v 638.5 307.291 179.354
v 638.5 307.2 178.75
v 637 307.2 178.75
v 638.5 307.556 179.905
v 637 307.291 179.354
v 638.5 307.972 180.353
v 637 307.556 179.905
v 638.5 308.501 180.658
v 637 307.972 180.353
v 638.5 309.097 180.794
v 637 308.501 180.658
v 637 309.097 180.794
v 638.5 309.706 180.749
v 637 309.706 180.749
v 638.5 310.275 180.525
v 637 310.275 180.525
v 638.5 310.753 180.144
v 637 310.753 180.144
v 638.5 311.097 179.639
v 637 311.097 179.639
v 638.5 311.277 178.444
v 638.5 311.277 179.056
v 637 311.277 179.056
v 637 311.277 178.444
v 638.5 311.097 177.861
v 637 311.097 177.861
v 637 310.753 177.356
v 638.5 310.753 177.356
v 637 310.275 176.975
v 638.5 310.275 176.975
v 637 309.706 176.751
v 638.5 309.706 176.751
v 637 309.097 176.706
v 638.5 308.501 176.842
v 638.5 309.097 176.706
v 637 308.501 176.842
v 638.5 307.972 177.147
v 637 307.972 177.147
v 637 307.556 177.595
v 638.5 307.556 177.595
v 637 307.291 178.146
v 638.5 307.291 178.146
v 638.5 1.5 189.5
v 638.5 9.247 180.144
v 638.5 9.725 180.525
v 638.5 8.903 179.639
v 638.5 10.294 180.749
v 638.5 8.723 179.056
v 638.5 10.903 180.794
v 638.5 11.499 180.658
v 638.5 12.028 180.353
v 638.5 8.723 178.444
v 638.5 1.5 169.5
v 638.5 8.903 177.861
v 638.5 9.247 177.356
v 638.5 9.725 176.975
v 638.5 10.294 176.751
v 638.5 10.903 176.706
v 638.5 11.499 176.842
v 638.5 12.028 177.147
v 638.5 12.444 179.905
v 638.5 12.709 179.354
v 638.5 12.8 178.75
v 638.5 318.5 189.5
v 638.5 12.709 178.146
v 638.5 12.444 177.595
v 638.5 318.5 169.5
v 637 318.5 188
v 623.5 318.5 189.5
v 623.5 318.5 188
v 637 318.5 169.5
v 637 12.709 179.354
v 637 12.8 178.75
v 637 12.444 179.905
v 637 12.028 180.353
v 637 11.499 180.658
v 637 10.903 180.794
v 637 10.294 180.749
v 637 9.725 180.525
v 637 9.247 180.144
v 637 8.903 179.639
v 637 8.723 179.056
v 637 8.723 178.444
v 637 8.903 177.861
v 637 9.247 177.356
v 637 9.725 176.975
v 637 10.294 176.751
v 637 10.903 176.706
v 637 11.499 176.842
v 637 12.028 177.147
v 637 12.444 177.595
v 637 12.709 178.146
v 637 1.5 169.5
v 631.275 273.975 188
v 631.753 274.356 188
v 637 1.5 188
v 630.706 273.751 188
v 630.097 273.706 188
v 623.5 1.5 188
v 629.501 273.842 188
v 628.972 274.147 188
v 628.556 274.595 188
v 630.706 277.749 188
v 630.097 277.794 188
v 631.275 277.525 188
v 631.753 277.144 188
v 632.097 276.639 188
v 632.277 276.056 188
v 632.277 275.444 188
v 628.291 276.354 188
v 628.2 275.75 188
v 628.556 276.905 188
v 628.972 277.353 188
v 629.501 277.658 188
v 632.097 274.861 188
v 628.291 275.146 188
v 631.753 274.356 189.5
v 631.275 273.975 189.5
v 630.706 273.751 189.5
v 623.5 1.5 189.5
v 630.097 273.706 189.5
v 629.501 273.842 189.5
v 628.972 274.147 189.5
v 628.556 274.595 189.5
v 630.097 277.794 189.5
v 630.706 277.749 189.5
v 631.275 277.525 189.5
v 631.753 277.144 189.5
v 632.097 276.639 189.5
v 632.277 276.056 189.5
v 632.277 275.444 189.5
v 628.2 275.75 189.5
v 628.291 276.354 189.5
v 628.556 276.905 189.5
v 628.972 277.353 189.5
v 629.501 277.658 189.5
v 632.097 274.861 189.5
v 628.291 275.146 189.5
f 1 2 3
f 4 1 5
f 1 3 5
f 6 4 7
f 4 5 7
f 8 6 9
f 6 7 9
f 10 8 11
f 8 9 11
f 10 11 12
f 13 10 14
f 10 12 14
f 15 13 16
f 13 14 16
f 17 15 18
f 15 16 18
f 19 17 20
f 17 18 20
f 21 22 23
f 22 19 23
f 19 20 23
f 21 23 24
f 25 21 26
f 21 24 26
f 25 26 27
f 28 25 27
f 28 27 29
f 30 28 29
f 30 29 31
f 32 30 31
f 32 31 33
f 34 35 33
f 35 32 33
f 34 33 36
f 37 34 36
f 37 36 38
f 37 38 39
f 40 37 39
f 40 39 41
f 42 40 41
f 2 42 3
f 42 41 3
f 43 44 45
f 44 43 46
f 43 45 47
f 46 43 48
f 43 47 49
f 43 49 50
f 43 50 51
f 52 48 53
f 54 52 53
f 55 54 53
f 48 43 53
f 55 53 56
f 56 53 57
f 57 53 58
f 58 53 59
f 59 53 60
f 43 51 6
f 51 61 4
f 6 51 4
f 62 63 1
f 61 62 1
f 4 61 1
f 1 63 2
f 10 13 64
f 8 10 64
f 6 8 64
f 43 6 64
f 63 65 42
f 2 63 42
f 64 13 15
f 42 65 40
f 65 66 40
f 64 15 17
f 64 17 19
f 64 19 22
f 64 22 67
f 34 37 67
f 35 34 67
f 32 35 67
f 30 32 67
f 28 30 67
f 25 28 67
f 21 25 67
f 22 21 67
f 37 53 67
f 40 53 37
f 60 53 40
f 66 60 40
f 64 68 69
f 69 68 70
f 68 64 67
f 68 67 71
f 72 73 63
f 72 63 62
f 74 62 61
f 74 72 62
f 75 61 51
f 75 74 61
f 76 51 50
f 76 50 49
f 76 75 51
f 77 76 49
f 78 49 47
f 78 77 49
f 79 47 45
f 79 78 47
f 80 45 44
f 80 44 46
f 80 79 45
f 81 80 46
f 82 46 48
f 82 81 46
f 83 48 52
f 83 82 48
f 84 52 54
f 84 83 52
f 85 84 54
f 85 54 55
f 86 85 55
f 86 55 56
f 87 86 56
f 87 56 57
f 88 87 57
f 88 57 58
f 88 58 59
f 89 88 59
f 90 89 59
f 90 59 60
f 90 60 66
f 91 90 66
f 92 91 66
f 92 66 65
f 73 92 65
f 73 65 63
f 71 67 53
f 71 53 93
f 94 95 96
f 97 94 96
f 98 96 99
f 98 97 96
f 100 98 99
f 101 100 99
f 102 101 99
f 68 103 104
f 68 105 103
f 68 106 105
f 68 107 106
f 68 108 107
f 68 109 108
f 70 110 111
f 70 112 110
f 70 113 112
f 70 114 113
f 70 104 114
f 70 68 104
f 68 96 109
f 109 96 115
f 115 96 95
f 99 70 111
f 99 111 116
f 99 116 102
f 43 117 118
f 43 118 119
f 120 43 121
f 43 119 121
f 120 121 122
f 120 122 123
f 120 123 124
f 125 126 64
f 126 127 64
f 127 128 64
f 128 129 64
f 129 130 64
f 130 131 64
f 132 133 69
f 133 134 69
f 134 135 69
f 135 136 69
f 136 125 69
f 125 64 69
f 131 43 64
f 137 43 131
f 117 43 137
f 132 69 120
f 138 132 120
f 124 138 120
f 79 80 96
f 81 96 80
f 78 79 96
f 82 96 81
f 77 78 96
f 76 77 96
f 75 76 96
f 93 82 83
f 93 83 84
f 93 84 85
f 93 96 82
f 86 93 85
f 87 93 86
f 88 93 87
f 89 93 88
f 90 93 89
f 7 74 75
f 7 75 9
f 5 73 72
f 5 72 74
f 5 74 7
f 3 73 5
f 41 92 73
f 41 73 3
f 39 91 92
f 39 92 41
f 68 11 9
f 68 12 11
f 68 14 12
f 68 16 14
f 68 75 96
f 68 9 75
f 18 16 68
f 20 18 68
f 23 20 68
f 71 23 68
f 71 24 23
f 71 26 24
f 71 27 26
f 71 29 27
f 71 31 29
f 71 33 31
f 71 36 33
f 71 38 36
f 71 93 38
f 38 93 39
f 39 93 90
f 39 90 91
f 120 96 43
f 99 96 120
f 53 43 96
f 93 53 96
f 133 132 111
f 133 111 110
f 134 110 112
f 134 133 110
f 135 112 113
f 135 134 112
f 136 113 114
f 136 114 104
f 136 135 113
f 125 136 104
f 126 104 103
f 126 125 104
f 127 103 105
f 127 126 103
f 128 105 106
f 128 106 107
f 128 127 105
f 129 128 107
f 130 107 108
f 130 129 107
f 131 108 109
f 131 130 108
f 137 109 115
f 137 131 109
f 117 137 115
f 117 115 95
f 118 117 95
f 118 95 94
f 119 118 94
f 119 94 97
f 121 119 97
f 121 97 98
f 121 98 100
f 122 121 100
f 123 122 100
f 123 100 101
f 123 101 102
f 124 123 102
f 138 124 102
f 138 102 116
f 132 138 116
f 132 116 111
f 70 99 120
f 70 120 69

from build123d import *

# Parameters (mm, degrees)
BOX007_W      = 15
BOX007_H      = 317
BOX007_DEPTH  = 20
BOX006_W      = 15
BOX006_H      = 317
BOX006_DEPTH  = 20
SKETCH010_R   = 2.05
HOLE005_DEPTH = 637.469553
SKETCH019_R   = 2.05
HOLE012_DEPTH = 20.001


with BuildPart() as cut017:
    # Box007 → Box007 (new body)
    with BuildSketch(Plane(origin=(1.5, 0, -1.5), x_dir=(1, 0, 0), z_dir=(0, 0, 1))):
        with Locations((7.5, 158.5)):
            Rectangle(BOX007_W, BOX007_H)
    extrude(amount=BOX007_DEPTH)


with BuildPart() as side_middle_body:
    # Box006 → Box006 (new body)
    with BuildSketch(Plane.XY):
        with Locations((7.5, 158.5)):
            Rectangle(BOX006_W, BOX006_H)
    extrude(amount=BOX006_DEPTH)

    # Cut013: cut Cut017
    add(cut017.part, mode=Mode.SUBTRACT)


with BuildPart() as side_middle_body_1:
    # Cut013 placement: moved
    add(side_middle_body.part.moved(Location((1.5, 1.5, 158))))


with BuildPart() as side_middle_body_2:
    # BaseFeature004 placement: moved
    add(side_middle_body_1.part.moved(Location((-1.5, -1.5, -158))))

    # Sketch010 → Hole005 (cut, through all)
    with BuildSketch(Plane.YZ.offset(1.5)):
        with Locations((9.25, 9.25)):
            Circle(SKETCH010_R)
    hole005 = extrude(amount=-HOLE005_DEPTH, mode=Mode.SUBTRACT)

    # Mirrored003: Hole005 across Sketch010 Axis0
    add(hole005.mirror(Plane(origin=(1.5, 158.5, 18.5), x_dir=(1, 0, 0), z_dir=(0, 1, 0))), mode=Mode.SUBTRACT)

    # Sketch019 → Hole012 (cut, through all)
    with BuildSketch(Plane.XY.offset(20)):
        with Locations((8.25, 274.25)):
            Circle(SKETCH019_R)
    extrude(amount=-HOLE012_DEPTH, mode=Mode.SUBTRACT)


with BuildPart() as side_middle_body_3:
    # Body004 placement: moved
    add(side_middle_body_2.part.moved(Location((1.5, 1.5, 169.5))))


with BuildPart() as left_middle_mirror:
    # Part__Mirroring003: instance of side_middle_body
    add(side_middle_body_3.part.mirror(Plane(origin=(1.5e-05, 160, 169.5), x_dir=(0, -1, 0), z_dir=(1, 0, 0))))


with BuildPart() as left_middle_mirror_1:
    # Part__Mirroring003 placement: moved
    add(left_middle_mirror.part.moved(Location((640, 0, 0))))


solid = left_middle_mirror_1.part
